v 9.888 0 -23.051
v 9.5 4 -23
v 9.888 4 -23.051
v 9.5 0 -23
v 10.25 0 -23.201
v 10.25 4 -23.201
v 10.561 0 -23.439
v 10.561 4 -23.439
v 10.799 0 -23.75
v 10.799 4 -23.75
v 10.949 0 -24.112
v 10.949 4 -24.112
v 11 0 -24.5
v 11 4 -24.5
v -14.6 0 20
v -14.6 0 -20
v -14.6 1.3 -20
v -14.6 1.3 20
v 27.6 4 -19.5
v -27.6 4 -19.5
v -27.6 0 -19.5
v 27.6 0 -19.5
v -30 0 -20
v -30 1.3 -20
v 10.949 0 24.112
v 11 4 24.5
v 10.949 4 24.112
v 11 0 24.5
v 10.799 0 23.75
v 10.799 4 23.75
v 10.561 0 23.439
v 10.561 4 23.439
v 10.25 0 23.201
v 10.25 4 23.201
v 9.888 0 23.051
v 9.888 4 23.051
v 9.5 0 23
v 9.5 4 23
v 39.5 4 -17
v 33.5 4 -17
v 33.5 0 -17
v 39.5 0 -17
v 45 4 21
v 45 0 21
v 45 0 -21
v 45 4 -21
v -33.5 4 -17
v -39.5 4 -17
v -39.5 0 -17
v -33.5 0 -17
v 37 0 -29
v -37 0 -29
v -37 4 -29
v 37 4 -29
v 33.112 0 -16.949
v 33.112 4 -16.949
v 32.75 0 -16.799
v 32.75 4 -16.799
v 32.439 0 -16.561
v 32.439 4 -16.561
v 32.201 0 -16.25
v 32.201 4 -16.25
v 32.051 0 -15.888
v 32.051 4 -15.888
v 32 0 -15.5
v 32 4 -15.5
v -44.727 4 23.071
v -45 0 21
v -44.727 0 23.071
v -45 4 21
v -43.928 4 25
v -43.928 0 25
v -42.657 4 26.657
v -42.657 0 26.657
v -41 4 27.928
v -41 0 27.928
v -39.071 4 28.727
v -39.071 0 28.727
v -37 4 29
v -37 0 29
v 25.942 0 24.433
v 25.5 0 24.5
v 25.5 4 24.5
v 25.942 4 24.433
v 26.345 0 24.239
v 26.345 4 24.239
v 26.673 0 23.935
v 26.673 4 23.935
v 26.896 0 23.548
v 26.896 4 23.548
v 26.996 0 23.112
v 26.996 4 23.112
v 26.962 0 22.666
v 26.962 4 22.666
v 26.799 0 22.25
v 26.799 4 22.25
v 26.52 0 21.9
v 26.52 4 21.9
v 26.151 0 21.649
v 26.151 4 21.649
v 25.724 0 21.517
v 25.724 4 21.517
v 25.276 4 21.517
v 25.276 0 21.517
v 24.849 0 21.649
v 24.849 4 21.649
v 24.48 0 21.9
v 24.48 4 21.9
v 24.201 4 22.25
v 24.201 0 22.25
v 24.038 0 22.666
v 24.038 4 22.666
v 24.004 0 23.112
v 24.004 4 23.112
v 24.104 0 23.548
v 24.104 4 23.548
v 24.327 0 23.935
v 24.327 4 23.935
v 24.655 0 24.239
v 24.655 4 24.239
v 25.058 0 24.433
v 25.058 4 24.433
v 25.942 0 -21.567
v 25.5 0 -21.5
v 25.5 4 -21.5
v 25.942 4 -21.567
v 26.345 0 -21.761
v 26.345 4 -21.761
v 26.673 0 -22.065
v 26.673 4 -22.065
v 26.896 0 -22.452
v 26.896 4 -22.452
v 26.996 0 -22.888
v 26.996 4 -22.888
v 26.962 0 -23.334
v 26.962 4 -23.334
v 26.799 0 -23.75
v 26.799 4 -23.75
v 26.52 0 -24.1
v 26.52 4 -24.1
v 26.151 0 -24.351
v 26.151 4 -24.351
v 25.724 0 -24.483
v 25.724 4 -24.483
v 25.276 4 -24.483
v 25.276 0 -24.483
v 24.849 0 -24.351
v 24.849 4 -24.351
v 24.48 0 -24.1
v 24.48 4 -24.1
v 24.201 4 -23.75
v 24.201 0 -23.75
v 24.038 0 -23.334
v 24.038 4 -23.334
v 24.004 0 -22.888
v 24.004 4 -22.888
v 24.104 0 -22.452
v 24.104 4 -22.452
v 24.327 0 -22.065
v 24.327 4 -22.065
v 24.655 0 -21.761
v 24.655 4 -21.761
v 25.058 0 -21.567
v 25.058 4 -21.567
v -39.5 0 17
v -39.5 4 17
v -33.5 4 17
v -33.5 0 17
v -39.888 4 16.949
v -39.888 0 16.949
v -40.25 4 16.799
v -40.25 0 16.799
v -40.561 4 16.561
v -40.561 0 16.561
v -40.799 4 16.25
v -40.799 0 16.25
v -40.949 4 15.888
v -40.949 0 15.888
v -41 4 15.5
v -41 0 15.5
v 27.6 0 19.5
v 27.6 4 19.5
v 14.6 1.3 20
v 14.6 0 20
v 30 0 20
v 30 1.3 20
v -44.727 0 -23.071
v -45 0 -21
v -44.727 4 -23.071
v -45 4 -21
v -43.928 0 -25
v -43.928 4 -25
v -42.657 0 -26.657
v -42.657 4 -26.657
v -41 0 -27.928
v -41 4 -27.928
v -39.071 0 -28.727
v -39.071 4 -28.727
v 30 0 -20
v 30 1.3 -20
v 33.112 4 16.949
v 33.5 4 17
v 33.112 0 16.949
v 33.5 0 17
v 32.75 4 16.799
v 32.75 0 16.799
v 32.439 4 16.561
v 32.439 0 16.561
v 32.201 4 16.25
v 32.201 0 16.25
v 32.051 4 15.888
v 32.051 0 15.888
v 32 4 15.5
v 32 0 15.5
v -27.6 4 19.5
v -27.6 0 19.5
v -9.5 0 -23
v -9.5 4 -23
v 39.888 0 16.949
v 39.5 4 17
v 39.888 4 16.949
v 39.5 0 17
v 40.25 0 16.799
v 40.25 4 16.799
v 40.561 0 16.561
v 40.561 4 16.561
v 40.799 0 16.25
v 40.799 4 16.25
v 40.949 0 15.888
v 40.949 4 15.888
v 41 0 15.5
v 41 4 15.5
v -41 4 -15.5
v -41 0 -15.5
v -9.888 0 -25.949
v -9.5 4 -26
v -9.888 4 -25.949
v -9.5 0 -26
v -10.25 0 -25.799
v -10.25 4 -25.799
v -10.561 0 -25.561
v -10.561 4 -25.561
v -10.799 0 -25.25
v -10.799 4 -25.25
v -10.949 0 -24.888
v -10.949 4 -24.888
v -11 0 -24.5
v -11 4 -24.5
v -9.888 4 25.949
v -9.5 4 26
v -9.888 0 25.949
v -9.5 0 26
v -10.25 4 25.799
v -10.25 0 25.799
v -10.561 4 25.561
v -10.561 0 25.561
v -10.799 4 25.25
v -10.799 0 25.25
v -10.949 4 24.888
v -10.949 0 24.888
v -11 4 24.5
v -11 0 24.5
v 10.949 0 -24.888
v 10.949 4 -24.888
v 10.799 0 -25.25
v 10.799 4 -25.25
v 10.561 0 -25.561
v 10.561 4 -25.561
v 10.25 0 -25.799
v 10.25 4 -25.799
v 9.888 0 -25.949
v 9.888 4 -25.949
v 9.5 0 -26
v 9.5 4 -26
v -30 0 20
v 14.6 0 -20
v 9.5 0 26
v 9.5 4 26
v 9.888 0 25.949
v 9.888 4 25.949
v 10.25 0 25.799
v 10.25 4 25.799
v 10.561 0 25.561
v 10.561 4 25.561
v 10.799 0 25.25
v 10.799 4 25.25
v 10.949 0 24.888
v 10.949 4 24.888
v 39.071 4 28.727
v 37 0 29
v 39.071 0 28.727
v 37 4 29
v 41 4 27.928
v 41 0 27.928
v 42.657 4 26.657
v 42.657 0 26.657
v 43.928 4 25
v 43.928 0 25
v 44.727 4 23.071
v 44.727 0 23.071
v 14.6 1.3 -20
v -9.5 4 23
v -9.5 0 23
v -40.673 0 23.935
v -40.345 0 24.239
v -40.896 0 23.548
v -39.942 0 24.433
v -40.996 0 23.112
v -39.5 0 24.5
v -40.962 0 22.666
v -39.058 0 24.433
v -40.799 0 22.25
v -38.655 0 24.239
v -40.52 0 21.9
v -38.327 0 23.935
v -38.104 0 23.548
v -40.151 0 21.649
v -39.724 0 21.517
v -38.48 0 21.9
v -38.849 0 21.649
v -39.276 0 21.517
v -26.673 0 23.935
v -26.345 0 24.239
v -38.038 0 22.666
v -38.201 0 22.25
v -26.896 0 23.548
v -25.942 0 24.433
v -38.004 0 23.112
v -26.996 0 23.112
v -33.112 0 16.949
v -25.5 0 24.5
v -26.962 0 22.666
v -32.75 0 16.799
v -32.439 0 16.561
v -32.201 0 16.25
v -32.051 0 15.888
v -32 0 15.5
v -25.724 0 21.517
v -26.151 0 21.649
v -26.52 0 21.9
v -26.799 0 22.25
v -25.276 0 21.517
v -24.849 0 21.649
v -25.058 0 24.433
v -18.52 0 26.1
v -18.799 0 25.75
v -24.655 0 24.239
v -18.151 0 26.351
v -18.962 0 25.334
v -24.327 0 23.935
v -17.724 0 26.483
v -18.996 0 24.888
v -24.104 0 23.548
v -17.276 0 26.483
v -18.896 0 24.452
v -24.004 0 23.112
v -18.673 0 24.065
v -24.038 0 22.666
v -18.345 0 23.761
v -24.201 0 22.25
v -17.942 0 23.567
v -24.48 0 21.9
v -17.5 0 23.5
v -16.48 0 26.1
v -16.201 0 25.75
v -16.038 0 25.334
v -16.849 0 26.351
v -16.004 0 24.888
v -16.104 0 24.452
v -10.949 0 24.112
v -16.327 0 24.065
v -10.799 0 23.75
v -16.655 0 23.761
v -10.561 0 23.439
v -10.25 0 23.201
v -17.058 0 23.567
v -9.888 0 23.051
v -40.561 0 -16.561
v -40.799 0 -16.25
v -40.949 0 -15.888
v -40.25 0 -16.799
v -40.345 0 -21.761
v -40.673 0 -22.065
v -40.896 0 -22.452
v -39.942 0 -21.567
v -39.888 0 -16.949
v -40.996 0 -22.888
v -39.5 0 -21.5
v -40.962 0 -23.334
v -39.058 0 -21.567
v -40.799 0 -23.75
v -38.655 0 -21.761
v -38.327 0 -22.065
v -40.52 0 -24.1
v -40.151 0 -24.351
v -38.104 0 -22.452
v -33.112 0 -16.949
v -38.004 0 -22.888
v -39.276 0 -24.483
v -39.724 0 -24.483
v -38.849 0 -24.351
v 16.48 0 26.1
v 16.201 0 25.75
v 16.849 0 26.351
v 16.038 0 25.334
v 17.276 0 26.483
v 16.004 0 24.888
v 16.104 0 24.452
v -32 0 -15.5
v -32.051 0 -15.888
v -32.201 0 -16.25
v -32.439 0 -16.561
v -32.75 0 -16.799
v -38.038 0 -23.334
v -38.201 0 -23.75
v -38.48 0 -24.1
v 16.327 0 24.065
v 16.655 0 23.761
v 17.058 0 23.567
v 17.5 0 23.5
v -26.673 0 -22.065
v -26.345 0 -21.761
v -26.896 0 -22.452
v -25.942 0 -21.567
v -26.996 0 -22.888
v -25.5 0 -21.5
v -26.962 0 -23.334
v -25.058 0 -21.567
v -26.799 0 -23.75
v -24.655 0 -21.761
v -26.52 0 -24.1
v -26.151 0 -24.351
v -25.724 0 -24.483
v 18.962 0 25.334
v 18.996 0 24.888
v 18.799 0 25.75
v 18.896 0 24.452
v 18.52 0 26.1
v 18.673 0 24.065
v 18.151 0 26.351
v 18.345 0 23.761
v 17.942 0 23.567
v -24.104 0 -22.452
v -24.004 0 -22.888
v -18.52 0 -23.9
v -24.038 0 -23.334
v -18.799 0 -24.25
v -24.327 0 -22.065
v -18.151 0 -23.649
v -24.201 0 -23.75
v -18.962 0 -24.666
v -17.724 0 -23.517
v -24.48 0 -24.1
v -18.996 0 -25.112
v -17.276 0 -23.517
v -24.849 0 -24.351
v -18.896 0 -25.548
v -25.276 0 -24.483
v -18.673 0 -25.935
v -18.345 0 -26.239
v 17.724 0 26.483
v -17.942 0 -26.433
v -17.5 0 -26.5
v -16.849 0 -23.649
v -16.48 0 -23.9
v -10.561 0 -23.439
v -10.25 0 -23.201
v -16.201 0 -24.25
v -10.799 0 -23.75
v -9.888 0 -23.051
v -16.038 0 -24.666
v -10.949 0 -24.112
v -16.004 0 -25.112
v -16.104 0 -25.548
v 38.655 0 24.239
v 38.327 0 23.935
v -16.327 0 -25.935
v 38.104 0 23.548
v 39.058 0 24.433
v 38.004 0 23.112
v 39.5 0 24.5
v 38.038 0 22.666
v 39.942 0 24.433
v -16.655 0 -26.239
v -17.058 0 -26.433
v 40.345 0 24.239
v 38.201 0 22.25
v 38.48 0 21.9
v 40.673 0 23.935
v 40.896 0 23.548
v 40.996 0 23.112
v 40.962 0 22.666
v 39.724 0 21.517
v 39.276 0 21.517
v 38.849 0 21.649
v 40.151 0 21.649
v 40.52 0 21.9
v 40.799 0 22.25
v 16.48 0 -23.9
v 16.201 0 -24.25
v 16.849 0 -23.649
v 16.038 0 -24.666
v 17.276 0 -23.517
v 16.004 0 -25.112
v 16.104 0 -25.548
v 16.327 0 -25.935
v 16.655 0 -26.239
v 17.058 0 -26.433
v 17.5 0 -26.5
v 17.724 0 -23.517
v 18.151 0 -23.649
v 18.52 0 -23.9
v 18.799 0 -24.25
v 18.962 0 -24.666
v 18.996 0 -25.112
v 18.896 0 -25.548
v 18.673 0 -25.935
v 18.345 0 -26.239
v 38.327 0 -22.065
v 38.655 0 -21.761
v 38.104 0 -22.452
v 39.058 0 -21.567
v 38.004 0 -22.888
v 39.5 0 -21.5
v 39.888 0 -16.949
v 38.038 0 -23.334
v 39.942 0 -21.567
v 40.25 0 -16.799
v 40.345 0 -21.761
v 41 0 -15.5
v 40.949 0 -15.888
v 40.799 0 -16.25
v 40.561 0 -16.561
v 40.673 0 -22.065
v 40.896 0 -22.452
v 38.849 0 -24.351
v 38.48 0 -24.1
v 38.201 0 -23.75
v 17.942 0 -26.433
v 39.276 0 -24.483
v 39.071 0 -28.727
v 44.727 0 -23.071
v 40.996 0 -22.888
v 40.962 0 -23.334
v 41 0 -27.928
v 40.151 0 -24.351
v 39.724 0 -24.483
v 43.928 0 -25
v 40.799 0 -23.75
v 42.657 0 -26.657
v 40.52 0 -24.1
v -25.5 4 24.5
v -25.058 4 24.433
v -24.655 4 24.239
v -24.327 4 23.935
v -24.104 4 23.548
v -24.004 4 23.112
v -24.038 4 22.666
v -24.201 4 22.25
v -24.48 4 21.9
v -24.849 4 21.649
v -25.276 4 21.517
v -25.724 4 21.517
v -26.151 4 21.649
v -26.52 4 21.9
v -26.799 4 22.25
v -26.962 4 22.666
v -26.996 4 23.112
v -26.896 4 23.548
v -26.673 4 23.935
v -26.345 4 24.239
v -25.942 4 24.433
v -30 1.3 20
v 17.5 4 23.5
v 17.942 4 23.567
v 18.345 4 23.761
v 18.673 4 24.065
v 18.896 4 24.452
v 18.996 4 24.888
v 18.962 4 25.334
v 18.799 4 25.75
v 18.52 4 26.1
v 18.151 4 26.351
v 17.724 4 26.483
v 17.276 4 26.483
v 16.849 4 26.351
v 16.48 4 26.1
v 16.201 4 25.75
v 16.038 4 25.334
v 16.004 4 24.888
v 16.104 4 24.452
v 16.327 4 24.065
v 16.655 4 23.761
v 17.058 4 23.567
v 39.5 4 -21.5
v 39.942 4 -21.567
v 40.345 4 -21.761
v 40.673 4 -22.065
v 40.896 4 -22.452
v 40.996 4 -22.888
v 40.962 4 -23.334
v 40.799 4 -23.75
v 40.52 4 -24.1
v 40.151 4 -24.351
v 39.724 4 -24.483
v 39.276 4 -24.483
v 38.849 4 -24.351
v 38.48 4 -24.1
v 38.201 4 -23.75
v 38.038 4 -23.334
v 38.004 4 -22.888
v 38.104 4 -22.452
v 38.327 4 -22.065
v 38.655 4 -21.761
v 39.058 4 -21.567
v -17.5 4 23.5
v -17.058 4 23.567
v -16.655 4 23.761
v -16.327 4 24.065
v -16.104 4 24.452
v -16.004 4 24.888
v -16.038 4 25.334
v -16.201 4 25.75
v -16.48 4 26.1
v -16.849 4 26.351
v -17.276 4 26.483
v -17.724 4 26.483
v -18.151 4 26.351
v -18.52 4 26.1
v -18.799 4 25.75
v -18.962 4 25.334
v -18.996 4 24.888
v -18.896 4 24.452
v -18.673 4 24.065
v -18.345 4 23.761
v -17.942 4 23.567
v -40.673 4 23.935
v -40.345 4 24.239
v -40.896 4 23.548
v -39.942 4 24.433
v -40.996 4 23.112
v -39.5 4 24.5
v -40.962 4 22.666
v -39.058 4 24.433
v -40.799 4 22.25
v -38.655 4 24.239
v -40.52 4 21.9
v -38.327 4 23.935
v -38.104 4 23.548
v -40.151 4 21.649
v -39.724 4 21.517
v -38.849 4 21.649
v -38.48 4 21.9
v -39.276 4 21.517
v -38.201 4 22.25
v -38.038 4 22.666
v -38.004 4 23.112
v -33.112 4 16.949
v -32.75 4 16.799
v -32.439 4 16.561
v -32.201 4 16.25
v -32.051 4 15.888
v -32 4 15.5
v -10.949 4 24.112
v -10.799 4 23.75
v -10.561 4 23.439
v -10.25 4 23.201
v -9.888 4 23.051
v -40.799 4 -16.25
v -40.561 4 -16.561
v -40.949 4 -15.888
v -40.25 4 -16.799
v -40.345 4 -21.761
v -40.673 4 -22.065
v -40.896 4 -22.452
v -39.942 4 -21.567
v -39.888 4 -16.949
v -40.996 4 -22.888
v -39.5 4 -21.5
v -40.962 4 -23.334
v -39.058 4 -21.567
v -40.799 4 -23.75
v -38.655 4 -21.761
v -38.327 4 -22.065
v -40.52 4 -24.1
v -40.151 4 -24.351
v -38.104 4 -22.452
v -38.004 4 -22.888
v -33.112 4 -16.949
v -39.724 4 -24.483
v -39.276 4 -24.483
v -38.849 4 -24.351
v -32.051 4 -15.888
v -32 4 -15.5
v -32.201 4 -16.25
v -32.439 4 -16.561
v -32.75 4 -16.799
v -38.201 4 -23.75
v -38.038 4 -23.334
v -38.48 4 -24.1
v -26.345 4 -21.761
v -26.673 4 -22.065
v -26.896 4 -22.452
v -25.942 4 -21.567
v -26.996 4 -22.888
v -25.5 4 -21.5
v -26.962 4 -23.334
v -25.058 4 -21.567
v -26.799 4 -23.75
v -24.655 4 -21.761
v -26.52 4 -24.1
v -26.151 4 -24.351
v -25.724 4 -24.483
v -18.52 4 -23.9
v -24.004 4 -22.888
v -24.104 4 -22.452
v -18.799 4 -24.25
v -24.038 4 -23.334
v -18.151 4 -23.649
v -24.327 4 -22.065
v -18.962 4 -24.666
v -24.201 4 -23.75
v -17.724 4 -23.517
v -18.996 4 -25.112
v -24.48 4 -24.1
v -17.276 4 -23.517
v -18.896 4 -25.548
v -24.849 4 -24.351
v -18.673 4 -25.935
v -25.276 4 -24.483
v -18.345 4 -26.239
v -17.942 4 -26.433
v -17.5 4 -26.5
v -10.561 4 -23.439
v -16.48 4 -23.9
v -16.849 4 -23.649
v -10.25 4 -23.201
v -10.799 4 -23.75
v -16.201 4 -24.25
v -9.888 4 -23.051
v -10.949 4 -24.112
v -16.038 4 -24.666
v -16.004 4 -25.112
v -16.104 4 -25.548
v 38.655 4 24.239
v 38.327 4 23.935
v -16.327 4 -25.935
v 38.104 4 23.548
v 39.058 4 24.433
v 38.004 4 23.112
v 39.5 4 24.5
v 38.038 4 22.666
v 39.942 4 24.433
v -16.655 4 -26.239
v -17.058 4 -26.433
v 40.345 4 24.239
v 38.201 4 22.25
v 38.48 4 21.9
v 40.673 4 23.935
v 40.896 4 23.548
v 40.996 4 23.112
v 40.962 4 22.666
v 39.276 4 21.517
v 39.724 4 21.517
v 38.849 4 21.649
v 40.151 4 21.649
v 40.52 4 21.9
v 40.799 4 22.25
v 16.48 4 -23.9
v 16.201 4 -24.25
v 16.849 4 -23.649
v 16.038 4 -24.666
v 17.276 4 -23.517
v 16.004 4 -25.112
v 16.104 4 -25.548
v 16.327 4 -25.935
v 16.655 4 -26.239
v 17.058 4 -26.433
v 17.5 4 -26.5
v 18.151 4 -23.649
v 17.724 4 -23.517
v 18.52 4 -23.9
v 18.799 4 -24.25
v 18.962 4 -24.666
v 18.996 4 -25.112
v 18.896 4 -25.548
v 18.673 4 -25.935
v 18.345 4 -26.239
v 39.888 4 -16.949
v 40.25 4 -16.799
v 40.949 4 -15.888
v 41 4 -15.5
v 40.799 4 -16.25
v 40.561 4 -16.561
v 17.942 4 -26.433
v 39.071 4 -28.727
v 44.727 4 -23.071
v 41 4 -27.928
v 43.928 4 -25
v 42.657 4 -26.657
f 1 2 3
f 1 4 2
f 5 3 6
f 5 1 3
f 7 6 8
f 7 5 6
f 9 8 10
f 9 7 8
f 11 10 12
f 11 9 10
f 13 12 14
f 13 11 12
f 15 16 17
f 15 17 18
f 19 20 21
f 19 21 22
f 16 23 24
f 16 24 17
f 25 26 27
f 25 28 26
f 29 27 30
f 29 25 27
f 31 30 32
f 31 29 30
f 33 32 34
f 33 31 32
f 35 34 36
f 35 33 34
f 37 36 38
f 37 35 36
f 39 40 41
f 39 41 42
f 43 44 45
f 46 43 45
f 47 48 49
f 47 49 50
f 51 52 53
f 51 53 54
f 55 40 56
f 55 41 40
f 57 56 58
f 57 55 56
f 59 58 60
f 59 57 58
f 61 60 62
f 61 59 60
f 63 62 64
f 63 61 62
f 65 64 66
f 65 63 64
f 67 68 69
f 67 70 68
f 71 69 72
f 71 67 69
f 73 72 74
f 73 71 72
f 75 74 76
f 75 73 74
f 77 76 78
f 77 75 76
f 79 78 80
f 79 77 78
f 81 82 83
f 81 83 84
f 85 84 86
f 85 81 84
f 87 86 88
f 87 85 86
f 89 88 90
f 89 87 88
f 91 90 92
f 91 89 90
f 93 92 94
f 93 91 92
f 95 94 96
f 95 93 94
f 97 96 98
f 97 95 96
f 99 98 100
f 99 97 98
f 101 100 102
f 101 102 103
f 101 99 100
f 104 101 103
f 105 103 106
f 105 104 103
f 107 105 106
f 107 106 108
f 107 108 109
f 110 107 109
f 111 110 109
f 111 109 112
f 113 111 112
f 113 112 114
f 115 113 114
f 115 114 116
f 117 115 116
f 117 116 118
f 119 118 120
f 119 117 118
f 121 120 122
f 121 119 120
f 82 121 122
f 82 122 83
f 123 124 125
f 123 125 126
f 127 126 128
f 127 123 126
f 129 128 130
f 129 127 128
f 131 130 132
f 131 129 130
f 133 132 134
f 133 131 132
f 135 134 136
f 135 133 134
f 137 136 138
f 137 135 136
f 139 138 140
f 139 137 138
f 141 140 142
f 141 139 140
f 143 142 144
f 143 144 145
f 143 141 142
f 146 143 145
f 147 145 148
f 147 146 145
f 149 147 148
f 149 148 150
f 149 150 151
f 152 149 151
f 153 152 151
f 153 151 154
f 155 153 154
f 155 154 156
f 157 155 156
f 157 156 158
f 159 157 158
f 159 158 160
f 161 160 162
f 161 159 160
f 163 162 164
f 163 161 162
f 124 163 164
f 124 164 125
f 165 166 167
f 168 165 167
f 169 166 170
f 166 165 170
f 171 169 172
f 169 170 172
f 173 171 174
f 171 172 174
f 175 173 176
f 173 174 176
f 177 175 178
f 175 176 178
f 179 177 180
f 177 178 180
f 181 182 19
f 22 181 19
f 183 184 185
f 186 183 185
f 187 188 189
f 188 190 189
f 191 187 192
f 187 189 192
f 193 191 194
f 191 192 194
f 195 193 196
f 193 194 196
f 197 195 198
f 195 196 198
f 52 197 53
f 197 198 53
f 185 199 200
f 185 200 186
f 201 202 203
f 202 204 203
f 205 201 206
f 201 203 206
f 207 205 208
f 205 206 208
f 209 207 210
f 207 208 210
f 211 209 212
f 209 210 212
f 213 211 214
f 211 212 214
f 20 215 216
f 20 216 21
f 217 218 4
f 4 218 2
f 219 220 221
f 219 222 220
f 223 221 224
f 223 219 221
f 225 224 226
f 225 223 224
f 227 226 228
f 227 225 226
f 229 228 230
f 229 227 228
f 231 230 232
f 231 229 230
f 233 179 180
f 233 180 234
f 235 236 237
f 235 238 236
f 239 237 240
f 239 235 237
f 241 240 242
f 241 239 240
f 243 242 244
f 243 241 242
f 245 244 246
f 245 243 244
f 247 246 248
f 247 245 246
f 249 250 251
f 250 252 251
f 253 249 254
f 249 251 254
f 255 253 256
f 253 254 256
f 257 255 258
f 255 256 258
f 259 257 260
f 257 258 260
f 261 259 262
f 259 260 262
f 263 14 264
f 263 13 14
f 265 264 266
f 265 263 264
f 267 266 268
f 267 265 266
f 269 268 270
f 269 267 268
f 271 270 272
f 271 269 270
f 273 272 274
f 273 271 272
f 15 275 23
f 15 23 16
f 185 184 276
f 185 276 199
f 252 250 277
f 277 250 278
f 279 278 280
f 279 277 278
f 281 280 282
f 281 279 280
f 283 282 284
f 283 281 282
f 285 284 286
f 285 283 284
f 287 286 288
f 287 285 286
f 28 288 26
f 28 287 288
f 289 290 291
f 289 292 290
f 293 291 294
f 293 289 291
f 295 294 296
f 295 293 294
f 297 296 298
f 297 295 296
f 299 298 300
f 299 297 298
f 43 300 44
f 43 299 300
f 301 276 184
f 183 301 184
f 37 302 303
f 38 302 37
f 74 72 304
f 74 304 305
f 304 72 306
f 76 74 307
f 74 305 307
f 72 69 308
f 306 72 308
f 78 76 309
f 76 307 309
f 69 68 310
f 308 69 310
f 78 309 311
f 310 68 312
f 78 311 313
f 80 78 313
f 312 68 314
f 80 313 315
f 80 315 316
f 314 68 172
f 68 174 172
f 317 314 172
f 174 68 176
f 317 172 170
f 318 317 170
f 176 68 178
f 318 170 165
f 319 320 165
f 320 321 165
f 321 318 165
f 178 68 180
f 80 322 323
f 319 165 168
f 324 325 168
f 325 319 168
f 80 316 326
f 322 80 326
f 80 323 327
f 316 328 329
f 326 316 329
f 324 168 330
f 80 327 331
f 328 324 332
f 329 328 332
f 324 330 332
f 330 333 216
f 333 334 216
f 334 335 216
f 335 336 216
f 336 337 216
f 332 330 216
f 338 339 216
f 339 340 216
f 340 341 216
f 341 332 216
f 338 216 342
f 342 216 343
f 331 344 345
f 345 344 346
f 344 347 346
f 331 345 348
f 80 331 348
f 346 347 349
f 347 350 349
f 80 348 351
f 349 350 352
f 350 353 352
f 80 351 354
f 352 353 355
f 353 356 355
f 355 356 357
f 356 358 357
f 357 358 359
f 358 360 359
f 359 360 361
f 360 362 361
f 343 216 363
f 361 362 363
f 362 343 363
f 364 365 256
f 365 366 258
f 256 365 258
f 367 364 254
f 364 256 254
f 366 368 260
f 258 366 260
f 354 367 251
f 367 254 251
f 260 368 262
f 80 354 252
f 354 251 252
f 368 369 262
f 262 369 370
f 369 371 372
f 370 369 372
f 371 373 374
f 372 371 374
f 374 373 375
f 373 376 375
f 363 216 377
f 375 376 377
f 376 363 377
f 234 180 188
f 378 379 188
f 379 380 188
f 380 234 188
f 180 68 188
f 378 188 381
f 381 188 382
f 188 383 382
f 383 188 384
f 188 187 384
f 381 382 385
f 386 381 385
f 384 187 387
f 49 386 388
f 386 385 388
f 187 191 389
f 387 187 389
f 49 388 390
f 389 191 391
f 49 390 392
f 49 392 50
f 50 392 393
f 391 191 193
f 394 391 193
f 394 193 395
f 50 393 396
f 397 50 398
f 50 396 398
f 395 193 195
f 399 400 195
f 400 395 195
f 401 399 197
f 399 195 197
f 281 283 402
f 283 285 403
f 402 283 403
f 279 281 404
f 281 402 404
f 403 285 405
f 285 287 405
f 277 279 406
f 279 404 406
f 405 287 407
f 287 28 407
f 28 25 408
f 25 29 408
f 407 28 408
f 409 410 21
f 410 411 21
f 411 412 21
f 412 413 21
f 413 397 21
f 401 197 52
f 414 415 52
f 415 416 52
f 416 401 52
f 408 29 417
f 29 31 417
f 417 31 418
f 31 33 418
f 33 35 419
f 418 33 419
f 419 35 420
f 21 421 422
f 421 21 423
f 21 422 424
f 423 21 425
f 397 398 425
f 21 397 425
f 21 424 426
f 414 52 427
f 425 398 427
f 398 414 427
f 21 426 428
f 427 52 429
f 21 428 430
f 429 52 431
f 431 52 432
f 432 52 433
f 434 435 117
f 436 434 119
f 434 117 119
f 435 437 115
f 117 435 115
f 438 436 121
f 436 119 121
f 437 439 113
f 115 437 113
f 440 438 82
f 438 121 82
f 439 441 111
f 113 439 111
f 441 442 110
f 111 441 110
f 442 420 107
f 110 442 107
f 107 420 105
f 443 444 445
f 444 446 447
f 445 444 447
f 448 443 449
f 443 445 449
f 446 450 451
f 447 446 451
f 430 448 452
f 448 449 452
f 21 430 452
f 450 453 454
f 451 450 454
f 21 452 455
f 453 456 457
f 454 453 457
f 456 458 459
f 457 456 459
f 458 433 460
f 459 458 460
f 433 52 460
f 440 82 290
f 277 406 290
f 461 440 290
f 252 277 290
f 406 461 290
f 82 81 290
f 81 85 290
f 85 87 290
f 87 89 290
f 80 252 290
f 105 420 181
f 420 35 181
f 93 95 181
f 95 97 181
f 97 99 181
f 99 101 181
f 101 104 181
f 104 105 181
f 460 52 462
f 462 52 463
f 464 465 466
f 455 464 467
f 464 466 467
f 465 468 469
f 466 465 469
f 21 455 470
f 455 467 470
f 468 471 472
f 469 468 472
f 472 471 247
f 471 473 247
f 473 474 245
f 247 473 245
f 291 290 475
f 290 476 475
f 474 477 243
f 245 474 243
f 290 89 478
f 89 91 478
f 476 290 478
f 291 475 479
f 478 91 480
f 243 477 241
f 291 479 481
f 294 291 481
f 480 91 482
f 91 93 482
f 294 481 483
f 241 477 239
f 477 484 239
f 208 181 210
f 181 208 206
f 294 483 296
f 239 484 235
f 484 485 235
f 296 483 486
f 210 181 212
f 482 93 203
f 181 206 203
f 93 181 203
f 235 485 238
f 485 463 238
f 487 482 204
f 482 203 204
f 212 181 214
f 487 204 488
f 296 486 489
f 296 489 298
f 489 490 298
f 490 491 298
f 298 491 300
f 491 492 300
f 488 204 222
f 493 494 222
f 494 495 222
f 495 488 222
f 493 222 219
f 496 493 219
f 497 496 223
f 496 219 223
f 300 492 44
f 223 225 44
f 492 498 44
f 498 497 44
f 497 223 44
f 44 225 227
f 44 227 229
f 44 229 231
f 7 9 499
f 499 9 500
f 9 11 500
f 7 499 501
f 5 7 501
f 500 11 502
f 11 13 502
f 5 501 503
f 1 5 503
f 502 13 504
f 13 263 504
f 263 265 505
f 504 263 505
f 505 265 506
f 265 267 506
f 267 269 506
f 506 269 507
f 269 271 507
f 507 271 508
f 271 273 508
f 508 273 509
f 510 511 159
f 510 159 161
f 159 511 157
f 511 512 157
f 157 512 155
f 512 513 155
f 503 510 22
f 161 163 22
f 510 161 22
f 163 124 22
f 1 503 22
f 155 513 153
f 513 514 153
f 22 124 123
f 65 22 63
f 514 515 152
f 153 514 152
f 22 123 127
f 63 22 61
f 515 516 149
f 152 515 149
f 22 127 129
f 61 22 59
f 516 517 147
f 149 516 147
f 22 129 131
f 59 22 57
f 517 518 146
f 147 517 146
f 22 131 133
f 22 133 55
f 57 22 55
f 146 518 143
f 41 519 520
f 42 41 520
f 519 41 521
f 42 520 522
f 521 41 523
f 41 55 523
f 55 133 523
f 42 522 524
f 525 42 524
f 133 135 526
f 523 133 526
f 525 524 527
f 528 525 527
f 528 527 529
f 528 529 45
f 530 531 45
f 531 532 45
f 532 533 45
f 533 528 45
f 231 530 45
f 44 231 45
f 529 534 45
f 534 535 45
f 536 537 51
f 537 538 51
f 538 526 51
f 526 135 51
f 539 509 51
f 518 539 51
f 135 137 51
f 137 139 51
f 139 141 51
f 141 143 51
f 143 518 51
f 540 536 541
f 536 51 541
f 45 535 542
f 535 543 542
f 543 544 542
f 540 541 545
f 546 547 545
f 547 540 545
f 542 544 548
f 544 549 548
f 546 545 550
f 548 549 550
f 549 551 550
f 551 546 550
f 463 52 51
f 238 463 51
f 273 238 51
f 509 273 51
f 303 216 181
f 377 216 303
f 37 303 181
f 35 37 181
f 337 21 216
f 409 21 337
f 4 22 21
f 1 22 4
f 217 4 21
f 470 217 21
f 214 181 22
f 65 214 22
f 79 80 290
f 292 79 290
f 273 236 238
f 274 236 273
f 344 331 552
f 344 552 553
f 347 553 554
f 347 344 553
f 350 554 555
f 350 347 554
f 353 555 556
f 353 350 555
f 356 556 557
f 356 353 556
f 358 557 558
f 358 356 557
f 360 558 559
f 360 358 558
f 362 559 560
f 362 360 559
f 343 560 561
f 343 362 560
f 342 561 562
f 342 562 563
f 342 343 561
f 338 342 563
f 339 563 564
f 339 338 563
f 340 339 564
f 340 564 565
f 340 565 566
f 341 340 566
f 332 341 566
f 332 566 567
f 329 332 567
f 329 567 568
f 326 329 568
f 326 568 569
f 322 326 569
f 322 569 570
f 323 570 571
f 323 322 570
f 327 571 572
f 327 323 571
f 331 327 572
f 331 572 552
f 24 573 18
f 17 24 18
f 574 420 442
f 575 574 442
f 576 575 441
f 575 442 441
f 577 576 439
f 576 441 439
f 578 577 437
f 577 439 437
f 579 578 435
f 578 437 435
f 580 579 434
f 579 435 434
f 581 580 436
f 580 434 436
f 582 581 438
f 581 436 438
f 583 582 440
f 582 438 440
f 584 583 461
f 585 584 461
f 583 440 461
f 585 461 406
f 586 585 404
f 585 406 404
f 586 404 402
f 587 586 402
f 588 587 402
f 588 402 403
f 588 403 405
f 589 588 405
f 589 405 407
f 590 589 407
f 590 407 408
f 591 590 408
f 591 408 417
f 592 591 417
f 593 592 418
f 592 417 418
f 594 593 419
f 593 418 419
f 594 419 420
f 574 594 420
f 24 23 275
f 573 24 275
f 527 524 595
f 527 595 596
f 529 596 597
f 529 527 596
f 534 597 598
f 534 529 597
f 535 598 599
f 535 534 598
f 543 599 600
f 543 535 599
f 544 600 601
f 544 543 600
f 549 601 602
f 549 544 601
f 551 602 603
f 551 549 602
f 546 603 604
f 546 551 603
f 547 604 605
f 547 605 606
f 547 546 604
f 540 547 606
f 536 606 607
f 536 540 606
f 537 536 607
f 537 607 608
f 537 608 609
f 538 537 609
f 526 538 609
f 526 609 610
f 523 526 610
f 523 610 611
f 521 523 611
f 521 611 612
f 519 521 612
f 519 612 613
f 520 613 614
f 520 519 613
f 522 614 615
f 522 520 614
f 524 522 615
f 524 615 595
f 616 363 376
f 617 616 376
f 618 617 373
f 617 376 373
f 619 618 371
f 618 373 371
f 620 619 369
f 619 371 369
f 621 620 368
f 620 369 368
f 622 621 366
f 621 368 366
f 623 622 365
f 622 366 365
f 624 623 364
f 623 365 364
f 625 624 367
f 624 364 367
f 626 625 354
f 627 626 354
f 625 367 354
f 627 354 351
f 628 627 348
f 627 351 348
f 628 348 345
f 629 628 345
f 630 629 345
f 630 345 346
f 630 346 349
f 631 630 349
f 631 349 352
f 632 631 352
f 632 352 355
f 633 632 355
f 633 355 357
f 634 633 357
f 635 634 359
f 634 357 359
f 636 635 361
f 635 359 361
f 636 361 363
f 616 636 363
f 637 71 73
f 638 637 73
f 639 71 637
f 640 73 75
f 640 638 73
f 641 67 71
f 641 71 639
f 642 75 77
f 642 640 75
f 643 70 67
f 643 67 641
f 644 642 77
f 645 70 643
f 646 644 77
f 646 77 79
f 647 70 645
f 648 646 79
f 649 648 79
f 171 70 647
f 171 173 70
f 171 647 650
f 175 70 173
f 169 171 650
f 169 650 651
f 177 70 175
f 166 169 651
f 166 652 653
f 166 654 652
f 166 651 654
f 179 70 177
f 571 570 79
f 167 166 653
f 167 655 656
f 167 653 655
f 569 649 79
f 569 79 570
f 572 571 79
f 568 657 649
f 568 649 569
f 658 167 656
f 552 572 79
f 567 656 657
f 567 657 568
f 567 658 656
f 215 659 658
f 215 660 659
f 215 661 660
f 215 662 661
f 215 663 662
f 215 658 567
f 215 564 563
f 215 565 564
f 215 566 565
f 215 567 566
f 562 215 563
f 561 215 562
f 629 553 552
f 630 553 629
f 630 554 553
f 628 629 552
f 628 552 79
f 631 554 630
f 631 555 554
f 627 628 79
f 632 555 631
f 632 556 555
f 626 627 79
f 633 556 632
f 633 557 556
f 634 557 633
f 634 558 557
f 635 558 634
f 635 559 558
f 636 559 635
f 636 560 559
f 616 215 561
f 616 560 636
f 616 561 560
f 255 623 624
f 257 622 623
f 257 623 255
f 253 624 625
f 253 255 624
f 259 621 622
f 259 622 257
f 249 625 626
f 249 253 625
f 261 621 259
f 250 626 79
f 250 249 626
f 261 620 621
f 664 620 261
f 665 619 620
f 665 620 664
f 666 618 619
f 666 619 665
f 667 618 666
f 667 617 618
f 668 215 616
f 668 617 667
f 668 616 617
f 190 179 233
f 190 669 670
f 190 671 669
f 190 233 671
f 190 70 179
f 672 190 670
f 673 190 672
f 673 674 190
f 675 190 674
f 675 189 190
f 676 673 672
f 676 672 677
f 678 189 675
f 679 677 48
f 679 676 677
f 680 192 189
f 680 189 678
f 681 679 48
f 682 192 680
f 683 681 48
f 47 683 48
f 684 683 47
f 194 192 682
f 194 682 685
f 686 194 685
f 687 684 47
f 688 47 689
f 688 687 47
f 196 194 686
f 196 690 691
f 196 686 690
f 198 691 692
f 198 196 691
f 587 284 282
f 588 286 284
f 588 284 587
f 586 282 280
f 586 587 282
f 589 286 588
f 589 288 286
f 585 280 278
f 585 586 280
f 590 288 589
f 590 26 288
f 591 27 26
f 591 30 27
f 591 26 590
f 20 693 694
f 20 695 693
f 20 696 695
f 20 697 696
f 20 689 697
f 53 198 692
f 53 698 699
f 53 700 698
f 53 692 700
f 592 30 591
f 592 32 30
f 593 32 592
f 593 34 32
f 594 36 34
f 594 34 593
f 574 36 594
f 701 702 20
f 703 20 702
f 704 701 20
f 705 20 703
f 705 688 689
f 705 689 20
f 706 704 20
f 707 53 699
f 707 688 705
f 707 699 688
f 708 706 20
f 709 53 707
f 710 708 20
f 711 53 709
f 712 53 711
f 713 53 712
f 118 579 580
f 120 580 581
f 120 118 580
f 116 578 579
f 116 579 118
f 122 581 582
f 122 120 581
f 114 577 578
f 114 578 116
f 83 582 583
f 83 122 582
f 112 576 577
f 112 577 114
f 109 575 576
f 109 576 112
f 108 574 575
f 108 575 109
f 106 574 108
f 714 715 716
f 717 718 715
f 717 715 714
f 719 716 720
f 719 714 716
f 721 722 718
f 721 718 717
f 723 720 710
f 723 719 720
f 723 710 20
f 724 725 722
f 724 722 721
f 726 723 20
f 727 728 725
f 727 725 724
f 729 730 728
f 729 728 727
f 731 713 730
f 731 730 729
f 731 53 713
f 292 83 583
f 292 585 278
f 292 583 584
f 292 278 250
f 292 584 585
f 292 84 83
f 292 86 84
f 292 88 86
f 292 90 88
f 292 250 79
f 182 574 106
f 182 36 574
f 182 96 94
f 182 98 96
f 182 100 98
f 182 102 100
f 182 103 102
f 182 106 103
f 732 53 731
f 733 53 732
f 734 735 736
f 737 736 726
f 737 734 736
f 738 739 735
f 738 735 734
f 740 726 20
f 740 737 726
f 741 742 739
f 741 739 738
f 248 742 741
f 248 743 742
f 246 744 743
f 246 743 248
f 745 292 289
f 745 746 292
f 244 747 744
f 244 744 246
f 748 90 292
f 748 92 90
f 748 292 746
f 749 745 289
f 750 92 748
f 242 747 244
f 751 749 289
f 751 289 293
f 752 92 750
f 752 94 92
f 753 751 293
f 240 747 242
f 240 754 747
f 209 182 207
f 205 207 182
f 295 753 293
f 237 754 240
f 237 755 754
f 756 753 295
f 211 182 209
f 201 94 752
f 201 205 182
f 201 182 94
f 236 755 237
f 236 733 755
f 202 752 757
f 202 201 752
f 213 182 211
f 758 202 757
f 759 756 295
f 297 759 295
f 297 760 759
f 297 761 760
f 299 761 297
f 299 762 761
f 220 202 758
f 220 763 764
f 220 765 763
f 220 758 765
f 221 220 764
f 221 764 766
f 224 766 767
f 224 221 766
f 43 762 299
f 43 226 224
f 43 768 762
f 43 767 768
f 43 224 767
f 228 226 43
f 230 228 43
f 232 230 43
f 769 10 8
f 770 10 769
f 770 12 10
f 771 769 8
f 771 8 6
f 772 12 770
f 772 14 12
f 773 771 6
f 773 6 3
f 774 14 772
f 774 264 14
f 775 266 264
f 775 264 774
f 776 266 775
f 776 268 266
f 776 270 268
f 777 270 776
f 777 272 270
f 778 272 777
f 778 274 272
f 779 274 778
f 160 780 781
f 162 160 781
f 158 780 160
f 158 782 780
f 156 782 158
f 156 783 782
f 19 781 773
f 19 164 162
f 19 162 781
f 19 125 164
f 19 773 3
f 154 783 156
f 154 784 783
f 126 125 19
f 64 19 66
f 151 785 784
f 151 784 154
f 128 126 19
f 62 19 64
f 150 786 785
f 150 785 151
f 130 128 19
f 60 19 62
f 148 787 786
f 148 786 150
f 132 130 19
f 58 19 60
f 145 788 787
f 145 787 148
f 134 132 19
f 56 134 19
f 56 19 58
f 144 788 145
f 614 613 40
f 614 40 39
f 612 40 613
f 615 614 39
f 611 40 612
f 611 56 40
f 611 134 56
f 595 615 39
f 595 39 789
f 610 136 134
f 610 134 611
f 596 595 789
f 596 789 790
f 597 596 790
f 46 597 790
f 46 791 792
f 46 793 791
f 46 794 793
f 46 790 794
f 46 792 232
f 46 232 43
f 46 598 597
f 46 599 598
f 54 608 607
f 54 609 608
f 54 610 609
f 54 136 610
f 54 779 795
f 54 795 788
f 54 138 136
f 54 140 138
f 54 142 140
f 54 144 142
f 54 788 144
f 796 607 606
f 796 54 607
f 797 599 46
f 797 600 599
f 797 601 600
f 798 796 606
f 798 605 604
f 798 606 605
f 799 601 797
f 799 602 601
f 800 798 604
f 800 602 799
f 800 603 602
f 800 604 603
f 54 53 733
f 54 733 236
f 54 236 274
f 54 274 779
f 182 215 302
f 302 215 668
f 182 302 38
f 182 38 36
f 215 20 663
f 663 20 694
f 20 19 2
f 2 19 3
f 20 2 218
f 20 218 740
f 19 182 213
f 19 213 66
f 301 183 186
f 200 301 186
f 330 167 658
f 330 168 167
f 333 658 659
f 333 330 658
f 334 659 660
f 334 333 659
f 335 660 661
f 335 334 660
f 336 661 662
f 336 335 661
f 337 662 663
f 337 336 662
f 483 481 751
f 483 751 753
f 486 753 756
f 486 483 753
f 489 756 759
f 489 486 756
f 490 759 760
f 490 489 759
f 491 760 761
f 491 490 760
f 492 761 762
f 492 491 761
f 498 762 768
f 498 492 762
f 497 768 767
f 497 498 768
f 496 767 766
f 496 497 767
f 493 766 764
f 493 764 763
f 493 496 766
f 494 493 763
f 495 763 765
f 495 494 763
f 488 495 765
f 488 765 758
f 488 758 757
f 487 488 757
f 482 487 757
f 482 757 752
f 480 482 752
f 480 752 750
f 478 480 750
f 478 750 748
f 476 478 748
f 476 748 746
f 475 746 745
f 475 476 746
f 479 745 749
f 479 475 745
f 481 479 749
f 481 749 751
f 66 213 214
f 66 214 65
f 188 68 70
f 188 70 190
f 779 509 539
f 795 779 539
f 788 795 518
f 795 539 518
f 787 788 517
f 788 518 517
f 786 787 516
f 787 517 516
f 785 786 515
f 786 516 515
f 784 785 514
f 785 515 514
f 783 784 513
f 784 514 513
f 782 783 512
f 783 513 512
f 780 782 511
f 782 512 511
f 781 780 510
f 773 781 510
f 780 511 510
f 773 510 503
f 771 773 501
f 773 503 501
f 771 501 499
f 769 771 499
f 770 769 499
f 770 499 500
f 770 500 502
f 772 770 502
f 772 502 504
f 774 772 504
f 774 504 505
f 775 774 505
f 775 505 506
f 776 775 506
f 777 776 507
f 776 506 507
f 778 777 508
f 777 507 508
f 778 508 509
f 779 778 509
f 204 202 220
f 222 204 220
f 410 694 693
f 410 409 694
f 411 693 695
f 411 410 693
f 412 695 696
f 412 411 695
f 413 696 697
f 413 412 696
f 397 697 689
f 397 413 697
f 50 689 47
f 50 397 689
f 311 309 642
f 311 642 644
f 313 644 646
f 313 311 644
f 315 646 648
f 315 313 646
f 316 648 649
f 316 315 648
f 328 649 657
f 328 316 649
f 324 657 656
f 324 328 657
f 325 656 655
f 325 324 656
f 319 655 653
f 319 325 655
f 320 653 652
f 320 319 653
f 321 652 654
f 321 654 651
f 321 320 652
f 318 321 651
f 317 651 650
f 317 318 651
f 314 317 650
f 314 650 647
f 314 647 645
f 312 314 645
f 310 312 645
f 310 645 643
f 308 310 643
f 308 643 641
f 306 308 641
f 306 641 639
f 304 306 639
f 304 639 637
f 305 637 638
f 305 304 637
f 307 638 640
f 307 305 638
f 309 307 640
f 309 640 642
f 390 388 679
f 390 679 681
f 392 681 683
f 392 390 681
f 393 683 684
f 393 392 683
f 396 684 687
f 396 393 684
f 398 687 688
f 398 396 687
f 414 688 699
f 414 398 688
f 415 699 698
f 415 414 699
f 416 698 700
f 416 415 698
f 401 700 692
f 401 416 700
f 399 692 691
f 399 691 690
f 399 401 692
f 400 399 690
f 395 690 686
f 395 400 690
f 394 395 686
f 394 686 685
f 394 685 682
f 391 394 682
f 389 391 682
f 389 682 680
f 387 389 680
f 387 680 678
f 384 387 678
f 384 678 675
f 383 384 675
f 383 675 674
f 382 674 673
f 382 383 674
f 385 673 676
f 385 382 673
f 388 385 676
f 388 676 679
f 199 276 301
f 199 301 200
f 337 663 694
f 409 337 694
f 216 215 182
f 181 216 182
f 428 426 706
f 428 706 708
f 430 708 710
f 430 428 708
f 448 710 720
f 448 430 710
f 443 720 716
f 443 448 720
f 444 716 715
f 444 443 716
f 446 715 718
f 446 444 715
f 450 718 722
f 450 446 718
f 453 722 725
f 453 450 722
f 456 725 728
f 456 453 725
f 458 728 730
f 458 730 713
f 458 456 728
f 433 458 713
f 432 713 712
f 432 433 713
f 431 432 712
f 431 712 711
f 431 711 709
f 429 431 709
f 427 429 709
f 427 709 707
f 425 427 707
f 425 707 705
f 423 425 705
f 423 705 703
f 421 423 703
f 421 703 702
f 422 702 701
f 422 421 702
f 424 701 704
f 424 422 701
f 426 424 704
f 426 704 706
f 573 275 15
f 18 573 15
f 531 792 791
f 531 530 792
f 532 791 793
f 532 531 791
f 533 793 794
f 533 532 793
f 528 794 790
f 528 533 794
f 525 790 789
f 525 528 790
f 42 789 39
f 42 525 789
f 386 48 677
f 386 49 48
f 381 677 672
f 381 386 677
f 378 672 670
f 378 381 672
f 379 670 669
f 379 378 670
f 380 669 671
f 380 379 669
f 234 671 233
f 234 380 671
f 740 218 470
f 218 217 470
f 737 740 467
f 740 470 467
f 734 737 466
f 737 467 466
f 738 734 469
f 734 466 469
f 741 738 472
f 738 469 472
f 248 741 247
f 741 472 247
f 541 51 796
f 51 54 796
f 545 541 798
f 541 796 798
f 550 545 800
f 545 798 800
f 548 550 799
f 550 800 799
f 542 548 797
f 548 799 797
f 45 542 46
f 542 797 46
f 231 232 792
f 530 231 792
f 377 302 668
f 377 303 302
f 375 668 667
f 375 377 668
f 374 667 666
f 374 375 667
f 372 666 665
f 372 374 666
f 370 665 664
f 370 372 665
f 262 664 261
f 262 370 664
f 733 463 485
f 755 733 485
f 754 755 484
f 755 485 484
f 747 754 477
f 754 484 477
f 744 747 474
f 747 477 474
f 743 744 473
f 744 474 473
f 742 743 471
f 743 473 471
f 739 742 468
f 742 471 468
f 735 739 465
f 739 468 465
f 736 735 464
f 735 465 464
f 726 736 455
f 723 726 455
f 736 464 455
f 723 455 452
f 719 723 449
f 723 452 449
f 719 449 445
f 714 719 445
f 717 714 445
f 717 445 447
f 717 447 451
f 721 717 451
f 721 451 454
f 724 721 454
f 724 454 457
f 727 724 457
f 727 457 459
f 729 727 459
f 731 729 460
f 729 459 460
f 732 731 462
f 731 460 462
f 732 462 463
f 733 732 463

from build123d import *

# Parameters (mm, degrees)
SKETCH_1_W          = 90
SKETCH_1_H          = 58
SKETCH_1_R          = 1.5
EXTRUDE_1_DEPTH     = 4
SKETCH_2_W          = 55.2
SKETCH_2_H          = 39
CUT_EXTRUDE_1_DEPTH = 4
SKETCH_13_R         = 1.5
CUT_EXTRUDE_6_DEPTH = 4
SKETCH_14_W         = 9
SKETCH_14_H         = 34
SKETCH_14_W_2       = 22
SKETCH_14_H_2       = 3
CUT_EXTRUDE_7_DEPTH = 4
FILLET_1_R          = 8
FILLET_2_R          = 1.5
SKETCH_18_W         = 15.4
SKETCH_18_H         = 40
EXTRUDE_4_DEPTH     = 1.3
EXTRUDE_4_2_DEPTH   = 1.3


with BuildPart() as part:
    # 草图1 → 凸台-拉伸1 (new body)
    with BuildSketch(Plane(origin=(0, 0, 0), x_dir=(1, 0, 0), z_dir=(0, 1, 0))):
        Rectangle(SKETCH_1_W, SKETCH_1_H)
        with Locations(Location((-25.5, 23, 0), (0, 0, 270))):
            Circle(SKETCH_1_R, mode=Mode.SUBTRACT)
        with Locations(Location((39.5, 23, 0), (0, 0, 270))):
            Circle(SKETCH_1_R, mode=Mode.SUBTRACT)
        with Locations(Location((-25.5, -23, 0), (0, 0, 270))):
            Circle(SKETCH_1_R, mode=Mode.SUBTRACT)
        with Locations(Location((39.5, -23, 0), (0, 0, 270))):
            Circle(SKETCH_1_R, mode=Mode.SUBTRACT)
        with Locations(Location((-39.5, 23, 0), (0, 0, 270))):
            Circle(SKETCH_1_R, mode=Mode.SUBTRACT)
        with Locations(Location((-39.5, -23, 0), (0, 0, 270))):
            Circle(SKETCH_1_R, mode=Mode.SUBTRACT)
        with Locations(Location((25.5, -23, 0), (0, 0, 270))):
            Circle(SKETCH_1_R, mode=Mode.SUBTRACT)
        with Locations(Location((25.5, 23, 0), (0, 0, 270))):
            Circle(SKETCH_1_R, mode=Mode.SUBTRACT)
    extrude(amount=EXTRUDE_1_DEPTH)

    # 草图2 → 切除-拉伸1 (cut)
    with BuildSketch(Plane(origin=(0, 4, 0), x_dir=(1, 0, 0), z_dir=(0, 1, 0))):
        Rectangle(SKETCH_2_W, SKETCH_2_H)
    extrude(amount=-CUT_EXTRUDE_1_DEPTH, mode=Mode.SUBTRACT)

    # 草图13 → 切除-拉伸6 (cut)
    with BuildSketch(Plane.XZ):
        with Locations(Location((-17.5, 25, 0), (0, 0, 270))):
            Circle(SKETCH_13_R)
        with Locations(Location((17.5, 25, 0), (0, 0, 270))):
            Circle(SKETCH_13_R)
        with Locations(Location((-17.5, -25, 0), (0, 0, 270))):
            Circle(SKETCH_13_R)
        with Locations(Location((17.5, -25, 0), (0, 0, 270))):
            Circle(SKETCH_13_R)
    extrude(amount=-CUT_EXTRUDE_6_DEPTH, mode=Mode.SUBTRACT)

    # 草图14 → 切除-拉伸7 (cut)
    with BuildSketch(Plane(origin=(0, 4, 0), x_dir=(1, 0, 0), z_dir=(0, 1, 0))):
        with Locations((36.5, 0)):
            Rectangle(SKETCH_14_W, SKETCH_14_H)
        with Locations((-36.5, 0)):
            Rectangle(SKETCH_14_W, SKETCH_14_H)
        with Locations((0, 24.5)):
            Rectangle(SKETCH_14_W_2, SKETCH_14_H_2)
        with Locations((0, -24.5)):
            Rectangle(SKETCH_14_W_2, SKETCH_14_H_2)
    extrude(amount=-CUT_EXTRUDE_7_DEPTH, mode=Mode.SUBTRACT)

    # 圆角1
    fillet_1_edges = [part.edges().sort_by_distance(p)[0] for p in [
        (45, 2, 29),
        (-45, 2, 29),
        (-45, 2, -29),
        (45, 2, -29),
    ]]
    fillet(fillet_1_edges, radius=FILLET_1_R)

    # 圆角2
    fillet_2_edges = [part.edges().sort_by_distance(p)[0] for p in [
        (11, 2, 23),
        (-11, 2, 23),
        (11, 2, 26),
        (-11, 2, 26),
        (-11, 2, -23),
        (11, 2, -23),
        (11, 2, -26),
        (-11, 2, -26),
        (41, 2, 17),
        (32, 2, 17),
        (41, 2, -17),
        (32, 2, -17),
        (-41, 2, 17),
        (-32, 2, 17),
        (-32, 2, -17),
        (-41, 2, -17),
    ]]
    fillet(fillet_2_edges, radius=FILLET_2_R - 0.0001)  # a hair under: the kernel refuses the full size


with BuildPart() as body_2:
    # 草图18 → 凸台-拉伸4 (new body)
    with BuildSketch(Plane.XZ):
        with Locations((-22.3, 0)):
            Rectangle(SKETCH_18_W, SKETCH_18_H)
    extrude(amount=-EXTRUDE_4_DEPTH)


with BuildPart() as body_3:
    # 草图18 → Extrude 4 2 (new body)
    with BuildSketch(Plane.XZ):
        with Locations((22.3, 0)):
            Rectangle(SKETCH_18_W, SKETCH_18_H)
    extrude(amount=-EXTRUDE_4_2_DEPTH)


solid = Compound([part.part, body_2.part, body_3.part])
